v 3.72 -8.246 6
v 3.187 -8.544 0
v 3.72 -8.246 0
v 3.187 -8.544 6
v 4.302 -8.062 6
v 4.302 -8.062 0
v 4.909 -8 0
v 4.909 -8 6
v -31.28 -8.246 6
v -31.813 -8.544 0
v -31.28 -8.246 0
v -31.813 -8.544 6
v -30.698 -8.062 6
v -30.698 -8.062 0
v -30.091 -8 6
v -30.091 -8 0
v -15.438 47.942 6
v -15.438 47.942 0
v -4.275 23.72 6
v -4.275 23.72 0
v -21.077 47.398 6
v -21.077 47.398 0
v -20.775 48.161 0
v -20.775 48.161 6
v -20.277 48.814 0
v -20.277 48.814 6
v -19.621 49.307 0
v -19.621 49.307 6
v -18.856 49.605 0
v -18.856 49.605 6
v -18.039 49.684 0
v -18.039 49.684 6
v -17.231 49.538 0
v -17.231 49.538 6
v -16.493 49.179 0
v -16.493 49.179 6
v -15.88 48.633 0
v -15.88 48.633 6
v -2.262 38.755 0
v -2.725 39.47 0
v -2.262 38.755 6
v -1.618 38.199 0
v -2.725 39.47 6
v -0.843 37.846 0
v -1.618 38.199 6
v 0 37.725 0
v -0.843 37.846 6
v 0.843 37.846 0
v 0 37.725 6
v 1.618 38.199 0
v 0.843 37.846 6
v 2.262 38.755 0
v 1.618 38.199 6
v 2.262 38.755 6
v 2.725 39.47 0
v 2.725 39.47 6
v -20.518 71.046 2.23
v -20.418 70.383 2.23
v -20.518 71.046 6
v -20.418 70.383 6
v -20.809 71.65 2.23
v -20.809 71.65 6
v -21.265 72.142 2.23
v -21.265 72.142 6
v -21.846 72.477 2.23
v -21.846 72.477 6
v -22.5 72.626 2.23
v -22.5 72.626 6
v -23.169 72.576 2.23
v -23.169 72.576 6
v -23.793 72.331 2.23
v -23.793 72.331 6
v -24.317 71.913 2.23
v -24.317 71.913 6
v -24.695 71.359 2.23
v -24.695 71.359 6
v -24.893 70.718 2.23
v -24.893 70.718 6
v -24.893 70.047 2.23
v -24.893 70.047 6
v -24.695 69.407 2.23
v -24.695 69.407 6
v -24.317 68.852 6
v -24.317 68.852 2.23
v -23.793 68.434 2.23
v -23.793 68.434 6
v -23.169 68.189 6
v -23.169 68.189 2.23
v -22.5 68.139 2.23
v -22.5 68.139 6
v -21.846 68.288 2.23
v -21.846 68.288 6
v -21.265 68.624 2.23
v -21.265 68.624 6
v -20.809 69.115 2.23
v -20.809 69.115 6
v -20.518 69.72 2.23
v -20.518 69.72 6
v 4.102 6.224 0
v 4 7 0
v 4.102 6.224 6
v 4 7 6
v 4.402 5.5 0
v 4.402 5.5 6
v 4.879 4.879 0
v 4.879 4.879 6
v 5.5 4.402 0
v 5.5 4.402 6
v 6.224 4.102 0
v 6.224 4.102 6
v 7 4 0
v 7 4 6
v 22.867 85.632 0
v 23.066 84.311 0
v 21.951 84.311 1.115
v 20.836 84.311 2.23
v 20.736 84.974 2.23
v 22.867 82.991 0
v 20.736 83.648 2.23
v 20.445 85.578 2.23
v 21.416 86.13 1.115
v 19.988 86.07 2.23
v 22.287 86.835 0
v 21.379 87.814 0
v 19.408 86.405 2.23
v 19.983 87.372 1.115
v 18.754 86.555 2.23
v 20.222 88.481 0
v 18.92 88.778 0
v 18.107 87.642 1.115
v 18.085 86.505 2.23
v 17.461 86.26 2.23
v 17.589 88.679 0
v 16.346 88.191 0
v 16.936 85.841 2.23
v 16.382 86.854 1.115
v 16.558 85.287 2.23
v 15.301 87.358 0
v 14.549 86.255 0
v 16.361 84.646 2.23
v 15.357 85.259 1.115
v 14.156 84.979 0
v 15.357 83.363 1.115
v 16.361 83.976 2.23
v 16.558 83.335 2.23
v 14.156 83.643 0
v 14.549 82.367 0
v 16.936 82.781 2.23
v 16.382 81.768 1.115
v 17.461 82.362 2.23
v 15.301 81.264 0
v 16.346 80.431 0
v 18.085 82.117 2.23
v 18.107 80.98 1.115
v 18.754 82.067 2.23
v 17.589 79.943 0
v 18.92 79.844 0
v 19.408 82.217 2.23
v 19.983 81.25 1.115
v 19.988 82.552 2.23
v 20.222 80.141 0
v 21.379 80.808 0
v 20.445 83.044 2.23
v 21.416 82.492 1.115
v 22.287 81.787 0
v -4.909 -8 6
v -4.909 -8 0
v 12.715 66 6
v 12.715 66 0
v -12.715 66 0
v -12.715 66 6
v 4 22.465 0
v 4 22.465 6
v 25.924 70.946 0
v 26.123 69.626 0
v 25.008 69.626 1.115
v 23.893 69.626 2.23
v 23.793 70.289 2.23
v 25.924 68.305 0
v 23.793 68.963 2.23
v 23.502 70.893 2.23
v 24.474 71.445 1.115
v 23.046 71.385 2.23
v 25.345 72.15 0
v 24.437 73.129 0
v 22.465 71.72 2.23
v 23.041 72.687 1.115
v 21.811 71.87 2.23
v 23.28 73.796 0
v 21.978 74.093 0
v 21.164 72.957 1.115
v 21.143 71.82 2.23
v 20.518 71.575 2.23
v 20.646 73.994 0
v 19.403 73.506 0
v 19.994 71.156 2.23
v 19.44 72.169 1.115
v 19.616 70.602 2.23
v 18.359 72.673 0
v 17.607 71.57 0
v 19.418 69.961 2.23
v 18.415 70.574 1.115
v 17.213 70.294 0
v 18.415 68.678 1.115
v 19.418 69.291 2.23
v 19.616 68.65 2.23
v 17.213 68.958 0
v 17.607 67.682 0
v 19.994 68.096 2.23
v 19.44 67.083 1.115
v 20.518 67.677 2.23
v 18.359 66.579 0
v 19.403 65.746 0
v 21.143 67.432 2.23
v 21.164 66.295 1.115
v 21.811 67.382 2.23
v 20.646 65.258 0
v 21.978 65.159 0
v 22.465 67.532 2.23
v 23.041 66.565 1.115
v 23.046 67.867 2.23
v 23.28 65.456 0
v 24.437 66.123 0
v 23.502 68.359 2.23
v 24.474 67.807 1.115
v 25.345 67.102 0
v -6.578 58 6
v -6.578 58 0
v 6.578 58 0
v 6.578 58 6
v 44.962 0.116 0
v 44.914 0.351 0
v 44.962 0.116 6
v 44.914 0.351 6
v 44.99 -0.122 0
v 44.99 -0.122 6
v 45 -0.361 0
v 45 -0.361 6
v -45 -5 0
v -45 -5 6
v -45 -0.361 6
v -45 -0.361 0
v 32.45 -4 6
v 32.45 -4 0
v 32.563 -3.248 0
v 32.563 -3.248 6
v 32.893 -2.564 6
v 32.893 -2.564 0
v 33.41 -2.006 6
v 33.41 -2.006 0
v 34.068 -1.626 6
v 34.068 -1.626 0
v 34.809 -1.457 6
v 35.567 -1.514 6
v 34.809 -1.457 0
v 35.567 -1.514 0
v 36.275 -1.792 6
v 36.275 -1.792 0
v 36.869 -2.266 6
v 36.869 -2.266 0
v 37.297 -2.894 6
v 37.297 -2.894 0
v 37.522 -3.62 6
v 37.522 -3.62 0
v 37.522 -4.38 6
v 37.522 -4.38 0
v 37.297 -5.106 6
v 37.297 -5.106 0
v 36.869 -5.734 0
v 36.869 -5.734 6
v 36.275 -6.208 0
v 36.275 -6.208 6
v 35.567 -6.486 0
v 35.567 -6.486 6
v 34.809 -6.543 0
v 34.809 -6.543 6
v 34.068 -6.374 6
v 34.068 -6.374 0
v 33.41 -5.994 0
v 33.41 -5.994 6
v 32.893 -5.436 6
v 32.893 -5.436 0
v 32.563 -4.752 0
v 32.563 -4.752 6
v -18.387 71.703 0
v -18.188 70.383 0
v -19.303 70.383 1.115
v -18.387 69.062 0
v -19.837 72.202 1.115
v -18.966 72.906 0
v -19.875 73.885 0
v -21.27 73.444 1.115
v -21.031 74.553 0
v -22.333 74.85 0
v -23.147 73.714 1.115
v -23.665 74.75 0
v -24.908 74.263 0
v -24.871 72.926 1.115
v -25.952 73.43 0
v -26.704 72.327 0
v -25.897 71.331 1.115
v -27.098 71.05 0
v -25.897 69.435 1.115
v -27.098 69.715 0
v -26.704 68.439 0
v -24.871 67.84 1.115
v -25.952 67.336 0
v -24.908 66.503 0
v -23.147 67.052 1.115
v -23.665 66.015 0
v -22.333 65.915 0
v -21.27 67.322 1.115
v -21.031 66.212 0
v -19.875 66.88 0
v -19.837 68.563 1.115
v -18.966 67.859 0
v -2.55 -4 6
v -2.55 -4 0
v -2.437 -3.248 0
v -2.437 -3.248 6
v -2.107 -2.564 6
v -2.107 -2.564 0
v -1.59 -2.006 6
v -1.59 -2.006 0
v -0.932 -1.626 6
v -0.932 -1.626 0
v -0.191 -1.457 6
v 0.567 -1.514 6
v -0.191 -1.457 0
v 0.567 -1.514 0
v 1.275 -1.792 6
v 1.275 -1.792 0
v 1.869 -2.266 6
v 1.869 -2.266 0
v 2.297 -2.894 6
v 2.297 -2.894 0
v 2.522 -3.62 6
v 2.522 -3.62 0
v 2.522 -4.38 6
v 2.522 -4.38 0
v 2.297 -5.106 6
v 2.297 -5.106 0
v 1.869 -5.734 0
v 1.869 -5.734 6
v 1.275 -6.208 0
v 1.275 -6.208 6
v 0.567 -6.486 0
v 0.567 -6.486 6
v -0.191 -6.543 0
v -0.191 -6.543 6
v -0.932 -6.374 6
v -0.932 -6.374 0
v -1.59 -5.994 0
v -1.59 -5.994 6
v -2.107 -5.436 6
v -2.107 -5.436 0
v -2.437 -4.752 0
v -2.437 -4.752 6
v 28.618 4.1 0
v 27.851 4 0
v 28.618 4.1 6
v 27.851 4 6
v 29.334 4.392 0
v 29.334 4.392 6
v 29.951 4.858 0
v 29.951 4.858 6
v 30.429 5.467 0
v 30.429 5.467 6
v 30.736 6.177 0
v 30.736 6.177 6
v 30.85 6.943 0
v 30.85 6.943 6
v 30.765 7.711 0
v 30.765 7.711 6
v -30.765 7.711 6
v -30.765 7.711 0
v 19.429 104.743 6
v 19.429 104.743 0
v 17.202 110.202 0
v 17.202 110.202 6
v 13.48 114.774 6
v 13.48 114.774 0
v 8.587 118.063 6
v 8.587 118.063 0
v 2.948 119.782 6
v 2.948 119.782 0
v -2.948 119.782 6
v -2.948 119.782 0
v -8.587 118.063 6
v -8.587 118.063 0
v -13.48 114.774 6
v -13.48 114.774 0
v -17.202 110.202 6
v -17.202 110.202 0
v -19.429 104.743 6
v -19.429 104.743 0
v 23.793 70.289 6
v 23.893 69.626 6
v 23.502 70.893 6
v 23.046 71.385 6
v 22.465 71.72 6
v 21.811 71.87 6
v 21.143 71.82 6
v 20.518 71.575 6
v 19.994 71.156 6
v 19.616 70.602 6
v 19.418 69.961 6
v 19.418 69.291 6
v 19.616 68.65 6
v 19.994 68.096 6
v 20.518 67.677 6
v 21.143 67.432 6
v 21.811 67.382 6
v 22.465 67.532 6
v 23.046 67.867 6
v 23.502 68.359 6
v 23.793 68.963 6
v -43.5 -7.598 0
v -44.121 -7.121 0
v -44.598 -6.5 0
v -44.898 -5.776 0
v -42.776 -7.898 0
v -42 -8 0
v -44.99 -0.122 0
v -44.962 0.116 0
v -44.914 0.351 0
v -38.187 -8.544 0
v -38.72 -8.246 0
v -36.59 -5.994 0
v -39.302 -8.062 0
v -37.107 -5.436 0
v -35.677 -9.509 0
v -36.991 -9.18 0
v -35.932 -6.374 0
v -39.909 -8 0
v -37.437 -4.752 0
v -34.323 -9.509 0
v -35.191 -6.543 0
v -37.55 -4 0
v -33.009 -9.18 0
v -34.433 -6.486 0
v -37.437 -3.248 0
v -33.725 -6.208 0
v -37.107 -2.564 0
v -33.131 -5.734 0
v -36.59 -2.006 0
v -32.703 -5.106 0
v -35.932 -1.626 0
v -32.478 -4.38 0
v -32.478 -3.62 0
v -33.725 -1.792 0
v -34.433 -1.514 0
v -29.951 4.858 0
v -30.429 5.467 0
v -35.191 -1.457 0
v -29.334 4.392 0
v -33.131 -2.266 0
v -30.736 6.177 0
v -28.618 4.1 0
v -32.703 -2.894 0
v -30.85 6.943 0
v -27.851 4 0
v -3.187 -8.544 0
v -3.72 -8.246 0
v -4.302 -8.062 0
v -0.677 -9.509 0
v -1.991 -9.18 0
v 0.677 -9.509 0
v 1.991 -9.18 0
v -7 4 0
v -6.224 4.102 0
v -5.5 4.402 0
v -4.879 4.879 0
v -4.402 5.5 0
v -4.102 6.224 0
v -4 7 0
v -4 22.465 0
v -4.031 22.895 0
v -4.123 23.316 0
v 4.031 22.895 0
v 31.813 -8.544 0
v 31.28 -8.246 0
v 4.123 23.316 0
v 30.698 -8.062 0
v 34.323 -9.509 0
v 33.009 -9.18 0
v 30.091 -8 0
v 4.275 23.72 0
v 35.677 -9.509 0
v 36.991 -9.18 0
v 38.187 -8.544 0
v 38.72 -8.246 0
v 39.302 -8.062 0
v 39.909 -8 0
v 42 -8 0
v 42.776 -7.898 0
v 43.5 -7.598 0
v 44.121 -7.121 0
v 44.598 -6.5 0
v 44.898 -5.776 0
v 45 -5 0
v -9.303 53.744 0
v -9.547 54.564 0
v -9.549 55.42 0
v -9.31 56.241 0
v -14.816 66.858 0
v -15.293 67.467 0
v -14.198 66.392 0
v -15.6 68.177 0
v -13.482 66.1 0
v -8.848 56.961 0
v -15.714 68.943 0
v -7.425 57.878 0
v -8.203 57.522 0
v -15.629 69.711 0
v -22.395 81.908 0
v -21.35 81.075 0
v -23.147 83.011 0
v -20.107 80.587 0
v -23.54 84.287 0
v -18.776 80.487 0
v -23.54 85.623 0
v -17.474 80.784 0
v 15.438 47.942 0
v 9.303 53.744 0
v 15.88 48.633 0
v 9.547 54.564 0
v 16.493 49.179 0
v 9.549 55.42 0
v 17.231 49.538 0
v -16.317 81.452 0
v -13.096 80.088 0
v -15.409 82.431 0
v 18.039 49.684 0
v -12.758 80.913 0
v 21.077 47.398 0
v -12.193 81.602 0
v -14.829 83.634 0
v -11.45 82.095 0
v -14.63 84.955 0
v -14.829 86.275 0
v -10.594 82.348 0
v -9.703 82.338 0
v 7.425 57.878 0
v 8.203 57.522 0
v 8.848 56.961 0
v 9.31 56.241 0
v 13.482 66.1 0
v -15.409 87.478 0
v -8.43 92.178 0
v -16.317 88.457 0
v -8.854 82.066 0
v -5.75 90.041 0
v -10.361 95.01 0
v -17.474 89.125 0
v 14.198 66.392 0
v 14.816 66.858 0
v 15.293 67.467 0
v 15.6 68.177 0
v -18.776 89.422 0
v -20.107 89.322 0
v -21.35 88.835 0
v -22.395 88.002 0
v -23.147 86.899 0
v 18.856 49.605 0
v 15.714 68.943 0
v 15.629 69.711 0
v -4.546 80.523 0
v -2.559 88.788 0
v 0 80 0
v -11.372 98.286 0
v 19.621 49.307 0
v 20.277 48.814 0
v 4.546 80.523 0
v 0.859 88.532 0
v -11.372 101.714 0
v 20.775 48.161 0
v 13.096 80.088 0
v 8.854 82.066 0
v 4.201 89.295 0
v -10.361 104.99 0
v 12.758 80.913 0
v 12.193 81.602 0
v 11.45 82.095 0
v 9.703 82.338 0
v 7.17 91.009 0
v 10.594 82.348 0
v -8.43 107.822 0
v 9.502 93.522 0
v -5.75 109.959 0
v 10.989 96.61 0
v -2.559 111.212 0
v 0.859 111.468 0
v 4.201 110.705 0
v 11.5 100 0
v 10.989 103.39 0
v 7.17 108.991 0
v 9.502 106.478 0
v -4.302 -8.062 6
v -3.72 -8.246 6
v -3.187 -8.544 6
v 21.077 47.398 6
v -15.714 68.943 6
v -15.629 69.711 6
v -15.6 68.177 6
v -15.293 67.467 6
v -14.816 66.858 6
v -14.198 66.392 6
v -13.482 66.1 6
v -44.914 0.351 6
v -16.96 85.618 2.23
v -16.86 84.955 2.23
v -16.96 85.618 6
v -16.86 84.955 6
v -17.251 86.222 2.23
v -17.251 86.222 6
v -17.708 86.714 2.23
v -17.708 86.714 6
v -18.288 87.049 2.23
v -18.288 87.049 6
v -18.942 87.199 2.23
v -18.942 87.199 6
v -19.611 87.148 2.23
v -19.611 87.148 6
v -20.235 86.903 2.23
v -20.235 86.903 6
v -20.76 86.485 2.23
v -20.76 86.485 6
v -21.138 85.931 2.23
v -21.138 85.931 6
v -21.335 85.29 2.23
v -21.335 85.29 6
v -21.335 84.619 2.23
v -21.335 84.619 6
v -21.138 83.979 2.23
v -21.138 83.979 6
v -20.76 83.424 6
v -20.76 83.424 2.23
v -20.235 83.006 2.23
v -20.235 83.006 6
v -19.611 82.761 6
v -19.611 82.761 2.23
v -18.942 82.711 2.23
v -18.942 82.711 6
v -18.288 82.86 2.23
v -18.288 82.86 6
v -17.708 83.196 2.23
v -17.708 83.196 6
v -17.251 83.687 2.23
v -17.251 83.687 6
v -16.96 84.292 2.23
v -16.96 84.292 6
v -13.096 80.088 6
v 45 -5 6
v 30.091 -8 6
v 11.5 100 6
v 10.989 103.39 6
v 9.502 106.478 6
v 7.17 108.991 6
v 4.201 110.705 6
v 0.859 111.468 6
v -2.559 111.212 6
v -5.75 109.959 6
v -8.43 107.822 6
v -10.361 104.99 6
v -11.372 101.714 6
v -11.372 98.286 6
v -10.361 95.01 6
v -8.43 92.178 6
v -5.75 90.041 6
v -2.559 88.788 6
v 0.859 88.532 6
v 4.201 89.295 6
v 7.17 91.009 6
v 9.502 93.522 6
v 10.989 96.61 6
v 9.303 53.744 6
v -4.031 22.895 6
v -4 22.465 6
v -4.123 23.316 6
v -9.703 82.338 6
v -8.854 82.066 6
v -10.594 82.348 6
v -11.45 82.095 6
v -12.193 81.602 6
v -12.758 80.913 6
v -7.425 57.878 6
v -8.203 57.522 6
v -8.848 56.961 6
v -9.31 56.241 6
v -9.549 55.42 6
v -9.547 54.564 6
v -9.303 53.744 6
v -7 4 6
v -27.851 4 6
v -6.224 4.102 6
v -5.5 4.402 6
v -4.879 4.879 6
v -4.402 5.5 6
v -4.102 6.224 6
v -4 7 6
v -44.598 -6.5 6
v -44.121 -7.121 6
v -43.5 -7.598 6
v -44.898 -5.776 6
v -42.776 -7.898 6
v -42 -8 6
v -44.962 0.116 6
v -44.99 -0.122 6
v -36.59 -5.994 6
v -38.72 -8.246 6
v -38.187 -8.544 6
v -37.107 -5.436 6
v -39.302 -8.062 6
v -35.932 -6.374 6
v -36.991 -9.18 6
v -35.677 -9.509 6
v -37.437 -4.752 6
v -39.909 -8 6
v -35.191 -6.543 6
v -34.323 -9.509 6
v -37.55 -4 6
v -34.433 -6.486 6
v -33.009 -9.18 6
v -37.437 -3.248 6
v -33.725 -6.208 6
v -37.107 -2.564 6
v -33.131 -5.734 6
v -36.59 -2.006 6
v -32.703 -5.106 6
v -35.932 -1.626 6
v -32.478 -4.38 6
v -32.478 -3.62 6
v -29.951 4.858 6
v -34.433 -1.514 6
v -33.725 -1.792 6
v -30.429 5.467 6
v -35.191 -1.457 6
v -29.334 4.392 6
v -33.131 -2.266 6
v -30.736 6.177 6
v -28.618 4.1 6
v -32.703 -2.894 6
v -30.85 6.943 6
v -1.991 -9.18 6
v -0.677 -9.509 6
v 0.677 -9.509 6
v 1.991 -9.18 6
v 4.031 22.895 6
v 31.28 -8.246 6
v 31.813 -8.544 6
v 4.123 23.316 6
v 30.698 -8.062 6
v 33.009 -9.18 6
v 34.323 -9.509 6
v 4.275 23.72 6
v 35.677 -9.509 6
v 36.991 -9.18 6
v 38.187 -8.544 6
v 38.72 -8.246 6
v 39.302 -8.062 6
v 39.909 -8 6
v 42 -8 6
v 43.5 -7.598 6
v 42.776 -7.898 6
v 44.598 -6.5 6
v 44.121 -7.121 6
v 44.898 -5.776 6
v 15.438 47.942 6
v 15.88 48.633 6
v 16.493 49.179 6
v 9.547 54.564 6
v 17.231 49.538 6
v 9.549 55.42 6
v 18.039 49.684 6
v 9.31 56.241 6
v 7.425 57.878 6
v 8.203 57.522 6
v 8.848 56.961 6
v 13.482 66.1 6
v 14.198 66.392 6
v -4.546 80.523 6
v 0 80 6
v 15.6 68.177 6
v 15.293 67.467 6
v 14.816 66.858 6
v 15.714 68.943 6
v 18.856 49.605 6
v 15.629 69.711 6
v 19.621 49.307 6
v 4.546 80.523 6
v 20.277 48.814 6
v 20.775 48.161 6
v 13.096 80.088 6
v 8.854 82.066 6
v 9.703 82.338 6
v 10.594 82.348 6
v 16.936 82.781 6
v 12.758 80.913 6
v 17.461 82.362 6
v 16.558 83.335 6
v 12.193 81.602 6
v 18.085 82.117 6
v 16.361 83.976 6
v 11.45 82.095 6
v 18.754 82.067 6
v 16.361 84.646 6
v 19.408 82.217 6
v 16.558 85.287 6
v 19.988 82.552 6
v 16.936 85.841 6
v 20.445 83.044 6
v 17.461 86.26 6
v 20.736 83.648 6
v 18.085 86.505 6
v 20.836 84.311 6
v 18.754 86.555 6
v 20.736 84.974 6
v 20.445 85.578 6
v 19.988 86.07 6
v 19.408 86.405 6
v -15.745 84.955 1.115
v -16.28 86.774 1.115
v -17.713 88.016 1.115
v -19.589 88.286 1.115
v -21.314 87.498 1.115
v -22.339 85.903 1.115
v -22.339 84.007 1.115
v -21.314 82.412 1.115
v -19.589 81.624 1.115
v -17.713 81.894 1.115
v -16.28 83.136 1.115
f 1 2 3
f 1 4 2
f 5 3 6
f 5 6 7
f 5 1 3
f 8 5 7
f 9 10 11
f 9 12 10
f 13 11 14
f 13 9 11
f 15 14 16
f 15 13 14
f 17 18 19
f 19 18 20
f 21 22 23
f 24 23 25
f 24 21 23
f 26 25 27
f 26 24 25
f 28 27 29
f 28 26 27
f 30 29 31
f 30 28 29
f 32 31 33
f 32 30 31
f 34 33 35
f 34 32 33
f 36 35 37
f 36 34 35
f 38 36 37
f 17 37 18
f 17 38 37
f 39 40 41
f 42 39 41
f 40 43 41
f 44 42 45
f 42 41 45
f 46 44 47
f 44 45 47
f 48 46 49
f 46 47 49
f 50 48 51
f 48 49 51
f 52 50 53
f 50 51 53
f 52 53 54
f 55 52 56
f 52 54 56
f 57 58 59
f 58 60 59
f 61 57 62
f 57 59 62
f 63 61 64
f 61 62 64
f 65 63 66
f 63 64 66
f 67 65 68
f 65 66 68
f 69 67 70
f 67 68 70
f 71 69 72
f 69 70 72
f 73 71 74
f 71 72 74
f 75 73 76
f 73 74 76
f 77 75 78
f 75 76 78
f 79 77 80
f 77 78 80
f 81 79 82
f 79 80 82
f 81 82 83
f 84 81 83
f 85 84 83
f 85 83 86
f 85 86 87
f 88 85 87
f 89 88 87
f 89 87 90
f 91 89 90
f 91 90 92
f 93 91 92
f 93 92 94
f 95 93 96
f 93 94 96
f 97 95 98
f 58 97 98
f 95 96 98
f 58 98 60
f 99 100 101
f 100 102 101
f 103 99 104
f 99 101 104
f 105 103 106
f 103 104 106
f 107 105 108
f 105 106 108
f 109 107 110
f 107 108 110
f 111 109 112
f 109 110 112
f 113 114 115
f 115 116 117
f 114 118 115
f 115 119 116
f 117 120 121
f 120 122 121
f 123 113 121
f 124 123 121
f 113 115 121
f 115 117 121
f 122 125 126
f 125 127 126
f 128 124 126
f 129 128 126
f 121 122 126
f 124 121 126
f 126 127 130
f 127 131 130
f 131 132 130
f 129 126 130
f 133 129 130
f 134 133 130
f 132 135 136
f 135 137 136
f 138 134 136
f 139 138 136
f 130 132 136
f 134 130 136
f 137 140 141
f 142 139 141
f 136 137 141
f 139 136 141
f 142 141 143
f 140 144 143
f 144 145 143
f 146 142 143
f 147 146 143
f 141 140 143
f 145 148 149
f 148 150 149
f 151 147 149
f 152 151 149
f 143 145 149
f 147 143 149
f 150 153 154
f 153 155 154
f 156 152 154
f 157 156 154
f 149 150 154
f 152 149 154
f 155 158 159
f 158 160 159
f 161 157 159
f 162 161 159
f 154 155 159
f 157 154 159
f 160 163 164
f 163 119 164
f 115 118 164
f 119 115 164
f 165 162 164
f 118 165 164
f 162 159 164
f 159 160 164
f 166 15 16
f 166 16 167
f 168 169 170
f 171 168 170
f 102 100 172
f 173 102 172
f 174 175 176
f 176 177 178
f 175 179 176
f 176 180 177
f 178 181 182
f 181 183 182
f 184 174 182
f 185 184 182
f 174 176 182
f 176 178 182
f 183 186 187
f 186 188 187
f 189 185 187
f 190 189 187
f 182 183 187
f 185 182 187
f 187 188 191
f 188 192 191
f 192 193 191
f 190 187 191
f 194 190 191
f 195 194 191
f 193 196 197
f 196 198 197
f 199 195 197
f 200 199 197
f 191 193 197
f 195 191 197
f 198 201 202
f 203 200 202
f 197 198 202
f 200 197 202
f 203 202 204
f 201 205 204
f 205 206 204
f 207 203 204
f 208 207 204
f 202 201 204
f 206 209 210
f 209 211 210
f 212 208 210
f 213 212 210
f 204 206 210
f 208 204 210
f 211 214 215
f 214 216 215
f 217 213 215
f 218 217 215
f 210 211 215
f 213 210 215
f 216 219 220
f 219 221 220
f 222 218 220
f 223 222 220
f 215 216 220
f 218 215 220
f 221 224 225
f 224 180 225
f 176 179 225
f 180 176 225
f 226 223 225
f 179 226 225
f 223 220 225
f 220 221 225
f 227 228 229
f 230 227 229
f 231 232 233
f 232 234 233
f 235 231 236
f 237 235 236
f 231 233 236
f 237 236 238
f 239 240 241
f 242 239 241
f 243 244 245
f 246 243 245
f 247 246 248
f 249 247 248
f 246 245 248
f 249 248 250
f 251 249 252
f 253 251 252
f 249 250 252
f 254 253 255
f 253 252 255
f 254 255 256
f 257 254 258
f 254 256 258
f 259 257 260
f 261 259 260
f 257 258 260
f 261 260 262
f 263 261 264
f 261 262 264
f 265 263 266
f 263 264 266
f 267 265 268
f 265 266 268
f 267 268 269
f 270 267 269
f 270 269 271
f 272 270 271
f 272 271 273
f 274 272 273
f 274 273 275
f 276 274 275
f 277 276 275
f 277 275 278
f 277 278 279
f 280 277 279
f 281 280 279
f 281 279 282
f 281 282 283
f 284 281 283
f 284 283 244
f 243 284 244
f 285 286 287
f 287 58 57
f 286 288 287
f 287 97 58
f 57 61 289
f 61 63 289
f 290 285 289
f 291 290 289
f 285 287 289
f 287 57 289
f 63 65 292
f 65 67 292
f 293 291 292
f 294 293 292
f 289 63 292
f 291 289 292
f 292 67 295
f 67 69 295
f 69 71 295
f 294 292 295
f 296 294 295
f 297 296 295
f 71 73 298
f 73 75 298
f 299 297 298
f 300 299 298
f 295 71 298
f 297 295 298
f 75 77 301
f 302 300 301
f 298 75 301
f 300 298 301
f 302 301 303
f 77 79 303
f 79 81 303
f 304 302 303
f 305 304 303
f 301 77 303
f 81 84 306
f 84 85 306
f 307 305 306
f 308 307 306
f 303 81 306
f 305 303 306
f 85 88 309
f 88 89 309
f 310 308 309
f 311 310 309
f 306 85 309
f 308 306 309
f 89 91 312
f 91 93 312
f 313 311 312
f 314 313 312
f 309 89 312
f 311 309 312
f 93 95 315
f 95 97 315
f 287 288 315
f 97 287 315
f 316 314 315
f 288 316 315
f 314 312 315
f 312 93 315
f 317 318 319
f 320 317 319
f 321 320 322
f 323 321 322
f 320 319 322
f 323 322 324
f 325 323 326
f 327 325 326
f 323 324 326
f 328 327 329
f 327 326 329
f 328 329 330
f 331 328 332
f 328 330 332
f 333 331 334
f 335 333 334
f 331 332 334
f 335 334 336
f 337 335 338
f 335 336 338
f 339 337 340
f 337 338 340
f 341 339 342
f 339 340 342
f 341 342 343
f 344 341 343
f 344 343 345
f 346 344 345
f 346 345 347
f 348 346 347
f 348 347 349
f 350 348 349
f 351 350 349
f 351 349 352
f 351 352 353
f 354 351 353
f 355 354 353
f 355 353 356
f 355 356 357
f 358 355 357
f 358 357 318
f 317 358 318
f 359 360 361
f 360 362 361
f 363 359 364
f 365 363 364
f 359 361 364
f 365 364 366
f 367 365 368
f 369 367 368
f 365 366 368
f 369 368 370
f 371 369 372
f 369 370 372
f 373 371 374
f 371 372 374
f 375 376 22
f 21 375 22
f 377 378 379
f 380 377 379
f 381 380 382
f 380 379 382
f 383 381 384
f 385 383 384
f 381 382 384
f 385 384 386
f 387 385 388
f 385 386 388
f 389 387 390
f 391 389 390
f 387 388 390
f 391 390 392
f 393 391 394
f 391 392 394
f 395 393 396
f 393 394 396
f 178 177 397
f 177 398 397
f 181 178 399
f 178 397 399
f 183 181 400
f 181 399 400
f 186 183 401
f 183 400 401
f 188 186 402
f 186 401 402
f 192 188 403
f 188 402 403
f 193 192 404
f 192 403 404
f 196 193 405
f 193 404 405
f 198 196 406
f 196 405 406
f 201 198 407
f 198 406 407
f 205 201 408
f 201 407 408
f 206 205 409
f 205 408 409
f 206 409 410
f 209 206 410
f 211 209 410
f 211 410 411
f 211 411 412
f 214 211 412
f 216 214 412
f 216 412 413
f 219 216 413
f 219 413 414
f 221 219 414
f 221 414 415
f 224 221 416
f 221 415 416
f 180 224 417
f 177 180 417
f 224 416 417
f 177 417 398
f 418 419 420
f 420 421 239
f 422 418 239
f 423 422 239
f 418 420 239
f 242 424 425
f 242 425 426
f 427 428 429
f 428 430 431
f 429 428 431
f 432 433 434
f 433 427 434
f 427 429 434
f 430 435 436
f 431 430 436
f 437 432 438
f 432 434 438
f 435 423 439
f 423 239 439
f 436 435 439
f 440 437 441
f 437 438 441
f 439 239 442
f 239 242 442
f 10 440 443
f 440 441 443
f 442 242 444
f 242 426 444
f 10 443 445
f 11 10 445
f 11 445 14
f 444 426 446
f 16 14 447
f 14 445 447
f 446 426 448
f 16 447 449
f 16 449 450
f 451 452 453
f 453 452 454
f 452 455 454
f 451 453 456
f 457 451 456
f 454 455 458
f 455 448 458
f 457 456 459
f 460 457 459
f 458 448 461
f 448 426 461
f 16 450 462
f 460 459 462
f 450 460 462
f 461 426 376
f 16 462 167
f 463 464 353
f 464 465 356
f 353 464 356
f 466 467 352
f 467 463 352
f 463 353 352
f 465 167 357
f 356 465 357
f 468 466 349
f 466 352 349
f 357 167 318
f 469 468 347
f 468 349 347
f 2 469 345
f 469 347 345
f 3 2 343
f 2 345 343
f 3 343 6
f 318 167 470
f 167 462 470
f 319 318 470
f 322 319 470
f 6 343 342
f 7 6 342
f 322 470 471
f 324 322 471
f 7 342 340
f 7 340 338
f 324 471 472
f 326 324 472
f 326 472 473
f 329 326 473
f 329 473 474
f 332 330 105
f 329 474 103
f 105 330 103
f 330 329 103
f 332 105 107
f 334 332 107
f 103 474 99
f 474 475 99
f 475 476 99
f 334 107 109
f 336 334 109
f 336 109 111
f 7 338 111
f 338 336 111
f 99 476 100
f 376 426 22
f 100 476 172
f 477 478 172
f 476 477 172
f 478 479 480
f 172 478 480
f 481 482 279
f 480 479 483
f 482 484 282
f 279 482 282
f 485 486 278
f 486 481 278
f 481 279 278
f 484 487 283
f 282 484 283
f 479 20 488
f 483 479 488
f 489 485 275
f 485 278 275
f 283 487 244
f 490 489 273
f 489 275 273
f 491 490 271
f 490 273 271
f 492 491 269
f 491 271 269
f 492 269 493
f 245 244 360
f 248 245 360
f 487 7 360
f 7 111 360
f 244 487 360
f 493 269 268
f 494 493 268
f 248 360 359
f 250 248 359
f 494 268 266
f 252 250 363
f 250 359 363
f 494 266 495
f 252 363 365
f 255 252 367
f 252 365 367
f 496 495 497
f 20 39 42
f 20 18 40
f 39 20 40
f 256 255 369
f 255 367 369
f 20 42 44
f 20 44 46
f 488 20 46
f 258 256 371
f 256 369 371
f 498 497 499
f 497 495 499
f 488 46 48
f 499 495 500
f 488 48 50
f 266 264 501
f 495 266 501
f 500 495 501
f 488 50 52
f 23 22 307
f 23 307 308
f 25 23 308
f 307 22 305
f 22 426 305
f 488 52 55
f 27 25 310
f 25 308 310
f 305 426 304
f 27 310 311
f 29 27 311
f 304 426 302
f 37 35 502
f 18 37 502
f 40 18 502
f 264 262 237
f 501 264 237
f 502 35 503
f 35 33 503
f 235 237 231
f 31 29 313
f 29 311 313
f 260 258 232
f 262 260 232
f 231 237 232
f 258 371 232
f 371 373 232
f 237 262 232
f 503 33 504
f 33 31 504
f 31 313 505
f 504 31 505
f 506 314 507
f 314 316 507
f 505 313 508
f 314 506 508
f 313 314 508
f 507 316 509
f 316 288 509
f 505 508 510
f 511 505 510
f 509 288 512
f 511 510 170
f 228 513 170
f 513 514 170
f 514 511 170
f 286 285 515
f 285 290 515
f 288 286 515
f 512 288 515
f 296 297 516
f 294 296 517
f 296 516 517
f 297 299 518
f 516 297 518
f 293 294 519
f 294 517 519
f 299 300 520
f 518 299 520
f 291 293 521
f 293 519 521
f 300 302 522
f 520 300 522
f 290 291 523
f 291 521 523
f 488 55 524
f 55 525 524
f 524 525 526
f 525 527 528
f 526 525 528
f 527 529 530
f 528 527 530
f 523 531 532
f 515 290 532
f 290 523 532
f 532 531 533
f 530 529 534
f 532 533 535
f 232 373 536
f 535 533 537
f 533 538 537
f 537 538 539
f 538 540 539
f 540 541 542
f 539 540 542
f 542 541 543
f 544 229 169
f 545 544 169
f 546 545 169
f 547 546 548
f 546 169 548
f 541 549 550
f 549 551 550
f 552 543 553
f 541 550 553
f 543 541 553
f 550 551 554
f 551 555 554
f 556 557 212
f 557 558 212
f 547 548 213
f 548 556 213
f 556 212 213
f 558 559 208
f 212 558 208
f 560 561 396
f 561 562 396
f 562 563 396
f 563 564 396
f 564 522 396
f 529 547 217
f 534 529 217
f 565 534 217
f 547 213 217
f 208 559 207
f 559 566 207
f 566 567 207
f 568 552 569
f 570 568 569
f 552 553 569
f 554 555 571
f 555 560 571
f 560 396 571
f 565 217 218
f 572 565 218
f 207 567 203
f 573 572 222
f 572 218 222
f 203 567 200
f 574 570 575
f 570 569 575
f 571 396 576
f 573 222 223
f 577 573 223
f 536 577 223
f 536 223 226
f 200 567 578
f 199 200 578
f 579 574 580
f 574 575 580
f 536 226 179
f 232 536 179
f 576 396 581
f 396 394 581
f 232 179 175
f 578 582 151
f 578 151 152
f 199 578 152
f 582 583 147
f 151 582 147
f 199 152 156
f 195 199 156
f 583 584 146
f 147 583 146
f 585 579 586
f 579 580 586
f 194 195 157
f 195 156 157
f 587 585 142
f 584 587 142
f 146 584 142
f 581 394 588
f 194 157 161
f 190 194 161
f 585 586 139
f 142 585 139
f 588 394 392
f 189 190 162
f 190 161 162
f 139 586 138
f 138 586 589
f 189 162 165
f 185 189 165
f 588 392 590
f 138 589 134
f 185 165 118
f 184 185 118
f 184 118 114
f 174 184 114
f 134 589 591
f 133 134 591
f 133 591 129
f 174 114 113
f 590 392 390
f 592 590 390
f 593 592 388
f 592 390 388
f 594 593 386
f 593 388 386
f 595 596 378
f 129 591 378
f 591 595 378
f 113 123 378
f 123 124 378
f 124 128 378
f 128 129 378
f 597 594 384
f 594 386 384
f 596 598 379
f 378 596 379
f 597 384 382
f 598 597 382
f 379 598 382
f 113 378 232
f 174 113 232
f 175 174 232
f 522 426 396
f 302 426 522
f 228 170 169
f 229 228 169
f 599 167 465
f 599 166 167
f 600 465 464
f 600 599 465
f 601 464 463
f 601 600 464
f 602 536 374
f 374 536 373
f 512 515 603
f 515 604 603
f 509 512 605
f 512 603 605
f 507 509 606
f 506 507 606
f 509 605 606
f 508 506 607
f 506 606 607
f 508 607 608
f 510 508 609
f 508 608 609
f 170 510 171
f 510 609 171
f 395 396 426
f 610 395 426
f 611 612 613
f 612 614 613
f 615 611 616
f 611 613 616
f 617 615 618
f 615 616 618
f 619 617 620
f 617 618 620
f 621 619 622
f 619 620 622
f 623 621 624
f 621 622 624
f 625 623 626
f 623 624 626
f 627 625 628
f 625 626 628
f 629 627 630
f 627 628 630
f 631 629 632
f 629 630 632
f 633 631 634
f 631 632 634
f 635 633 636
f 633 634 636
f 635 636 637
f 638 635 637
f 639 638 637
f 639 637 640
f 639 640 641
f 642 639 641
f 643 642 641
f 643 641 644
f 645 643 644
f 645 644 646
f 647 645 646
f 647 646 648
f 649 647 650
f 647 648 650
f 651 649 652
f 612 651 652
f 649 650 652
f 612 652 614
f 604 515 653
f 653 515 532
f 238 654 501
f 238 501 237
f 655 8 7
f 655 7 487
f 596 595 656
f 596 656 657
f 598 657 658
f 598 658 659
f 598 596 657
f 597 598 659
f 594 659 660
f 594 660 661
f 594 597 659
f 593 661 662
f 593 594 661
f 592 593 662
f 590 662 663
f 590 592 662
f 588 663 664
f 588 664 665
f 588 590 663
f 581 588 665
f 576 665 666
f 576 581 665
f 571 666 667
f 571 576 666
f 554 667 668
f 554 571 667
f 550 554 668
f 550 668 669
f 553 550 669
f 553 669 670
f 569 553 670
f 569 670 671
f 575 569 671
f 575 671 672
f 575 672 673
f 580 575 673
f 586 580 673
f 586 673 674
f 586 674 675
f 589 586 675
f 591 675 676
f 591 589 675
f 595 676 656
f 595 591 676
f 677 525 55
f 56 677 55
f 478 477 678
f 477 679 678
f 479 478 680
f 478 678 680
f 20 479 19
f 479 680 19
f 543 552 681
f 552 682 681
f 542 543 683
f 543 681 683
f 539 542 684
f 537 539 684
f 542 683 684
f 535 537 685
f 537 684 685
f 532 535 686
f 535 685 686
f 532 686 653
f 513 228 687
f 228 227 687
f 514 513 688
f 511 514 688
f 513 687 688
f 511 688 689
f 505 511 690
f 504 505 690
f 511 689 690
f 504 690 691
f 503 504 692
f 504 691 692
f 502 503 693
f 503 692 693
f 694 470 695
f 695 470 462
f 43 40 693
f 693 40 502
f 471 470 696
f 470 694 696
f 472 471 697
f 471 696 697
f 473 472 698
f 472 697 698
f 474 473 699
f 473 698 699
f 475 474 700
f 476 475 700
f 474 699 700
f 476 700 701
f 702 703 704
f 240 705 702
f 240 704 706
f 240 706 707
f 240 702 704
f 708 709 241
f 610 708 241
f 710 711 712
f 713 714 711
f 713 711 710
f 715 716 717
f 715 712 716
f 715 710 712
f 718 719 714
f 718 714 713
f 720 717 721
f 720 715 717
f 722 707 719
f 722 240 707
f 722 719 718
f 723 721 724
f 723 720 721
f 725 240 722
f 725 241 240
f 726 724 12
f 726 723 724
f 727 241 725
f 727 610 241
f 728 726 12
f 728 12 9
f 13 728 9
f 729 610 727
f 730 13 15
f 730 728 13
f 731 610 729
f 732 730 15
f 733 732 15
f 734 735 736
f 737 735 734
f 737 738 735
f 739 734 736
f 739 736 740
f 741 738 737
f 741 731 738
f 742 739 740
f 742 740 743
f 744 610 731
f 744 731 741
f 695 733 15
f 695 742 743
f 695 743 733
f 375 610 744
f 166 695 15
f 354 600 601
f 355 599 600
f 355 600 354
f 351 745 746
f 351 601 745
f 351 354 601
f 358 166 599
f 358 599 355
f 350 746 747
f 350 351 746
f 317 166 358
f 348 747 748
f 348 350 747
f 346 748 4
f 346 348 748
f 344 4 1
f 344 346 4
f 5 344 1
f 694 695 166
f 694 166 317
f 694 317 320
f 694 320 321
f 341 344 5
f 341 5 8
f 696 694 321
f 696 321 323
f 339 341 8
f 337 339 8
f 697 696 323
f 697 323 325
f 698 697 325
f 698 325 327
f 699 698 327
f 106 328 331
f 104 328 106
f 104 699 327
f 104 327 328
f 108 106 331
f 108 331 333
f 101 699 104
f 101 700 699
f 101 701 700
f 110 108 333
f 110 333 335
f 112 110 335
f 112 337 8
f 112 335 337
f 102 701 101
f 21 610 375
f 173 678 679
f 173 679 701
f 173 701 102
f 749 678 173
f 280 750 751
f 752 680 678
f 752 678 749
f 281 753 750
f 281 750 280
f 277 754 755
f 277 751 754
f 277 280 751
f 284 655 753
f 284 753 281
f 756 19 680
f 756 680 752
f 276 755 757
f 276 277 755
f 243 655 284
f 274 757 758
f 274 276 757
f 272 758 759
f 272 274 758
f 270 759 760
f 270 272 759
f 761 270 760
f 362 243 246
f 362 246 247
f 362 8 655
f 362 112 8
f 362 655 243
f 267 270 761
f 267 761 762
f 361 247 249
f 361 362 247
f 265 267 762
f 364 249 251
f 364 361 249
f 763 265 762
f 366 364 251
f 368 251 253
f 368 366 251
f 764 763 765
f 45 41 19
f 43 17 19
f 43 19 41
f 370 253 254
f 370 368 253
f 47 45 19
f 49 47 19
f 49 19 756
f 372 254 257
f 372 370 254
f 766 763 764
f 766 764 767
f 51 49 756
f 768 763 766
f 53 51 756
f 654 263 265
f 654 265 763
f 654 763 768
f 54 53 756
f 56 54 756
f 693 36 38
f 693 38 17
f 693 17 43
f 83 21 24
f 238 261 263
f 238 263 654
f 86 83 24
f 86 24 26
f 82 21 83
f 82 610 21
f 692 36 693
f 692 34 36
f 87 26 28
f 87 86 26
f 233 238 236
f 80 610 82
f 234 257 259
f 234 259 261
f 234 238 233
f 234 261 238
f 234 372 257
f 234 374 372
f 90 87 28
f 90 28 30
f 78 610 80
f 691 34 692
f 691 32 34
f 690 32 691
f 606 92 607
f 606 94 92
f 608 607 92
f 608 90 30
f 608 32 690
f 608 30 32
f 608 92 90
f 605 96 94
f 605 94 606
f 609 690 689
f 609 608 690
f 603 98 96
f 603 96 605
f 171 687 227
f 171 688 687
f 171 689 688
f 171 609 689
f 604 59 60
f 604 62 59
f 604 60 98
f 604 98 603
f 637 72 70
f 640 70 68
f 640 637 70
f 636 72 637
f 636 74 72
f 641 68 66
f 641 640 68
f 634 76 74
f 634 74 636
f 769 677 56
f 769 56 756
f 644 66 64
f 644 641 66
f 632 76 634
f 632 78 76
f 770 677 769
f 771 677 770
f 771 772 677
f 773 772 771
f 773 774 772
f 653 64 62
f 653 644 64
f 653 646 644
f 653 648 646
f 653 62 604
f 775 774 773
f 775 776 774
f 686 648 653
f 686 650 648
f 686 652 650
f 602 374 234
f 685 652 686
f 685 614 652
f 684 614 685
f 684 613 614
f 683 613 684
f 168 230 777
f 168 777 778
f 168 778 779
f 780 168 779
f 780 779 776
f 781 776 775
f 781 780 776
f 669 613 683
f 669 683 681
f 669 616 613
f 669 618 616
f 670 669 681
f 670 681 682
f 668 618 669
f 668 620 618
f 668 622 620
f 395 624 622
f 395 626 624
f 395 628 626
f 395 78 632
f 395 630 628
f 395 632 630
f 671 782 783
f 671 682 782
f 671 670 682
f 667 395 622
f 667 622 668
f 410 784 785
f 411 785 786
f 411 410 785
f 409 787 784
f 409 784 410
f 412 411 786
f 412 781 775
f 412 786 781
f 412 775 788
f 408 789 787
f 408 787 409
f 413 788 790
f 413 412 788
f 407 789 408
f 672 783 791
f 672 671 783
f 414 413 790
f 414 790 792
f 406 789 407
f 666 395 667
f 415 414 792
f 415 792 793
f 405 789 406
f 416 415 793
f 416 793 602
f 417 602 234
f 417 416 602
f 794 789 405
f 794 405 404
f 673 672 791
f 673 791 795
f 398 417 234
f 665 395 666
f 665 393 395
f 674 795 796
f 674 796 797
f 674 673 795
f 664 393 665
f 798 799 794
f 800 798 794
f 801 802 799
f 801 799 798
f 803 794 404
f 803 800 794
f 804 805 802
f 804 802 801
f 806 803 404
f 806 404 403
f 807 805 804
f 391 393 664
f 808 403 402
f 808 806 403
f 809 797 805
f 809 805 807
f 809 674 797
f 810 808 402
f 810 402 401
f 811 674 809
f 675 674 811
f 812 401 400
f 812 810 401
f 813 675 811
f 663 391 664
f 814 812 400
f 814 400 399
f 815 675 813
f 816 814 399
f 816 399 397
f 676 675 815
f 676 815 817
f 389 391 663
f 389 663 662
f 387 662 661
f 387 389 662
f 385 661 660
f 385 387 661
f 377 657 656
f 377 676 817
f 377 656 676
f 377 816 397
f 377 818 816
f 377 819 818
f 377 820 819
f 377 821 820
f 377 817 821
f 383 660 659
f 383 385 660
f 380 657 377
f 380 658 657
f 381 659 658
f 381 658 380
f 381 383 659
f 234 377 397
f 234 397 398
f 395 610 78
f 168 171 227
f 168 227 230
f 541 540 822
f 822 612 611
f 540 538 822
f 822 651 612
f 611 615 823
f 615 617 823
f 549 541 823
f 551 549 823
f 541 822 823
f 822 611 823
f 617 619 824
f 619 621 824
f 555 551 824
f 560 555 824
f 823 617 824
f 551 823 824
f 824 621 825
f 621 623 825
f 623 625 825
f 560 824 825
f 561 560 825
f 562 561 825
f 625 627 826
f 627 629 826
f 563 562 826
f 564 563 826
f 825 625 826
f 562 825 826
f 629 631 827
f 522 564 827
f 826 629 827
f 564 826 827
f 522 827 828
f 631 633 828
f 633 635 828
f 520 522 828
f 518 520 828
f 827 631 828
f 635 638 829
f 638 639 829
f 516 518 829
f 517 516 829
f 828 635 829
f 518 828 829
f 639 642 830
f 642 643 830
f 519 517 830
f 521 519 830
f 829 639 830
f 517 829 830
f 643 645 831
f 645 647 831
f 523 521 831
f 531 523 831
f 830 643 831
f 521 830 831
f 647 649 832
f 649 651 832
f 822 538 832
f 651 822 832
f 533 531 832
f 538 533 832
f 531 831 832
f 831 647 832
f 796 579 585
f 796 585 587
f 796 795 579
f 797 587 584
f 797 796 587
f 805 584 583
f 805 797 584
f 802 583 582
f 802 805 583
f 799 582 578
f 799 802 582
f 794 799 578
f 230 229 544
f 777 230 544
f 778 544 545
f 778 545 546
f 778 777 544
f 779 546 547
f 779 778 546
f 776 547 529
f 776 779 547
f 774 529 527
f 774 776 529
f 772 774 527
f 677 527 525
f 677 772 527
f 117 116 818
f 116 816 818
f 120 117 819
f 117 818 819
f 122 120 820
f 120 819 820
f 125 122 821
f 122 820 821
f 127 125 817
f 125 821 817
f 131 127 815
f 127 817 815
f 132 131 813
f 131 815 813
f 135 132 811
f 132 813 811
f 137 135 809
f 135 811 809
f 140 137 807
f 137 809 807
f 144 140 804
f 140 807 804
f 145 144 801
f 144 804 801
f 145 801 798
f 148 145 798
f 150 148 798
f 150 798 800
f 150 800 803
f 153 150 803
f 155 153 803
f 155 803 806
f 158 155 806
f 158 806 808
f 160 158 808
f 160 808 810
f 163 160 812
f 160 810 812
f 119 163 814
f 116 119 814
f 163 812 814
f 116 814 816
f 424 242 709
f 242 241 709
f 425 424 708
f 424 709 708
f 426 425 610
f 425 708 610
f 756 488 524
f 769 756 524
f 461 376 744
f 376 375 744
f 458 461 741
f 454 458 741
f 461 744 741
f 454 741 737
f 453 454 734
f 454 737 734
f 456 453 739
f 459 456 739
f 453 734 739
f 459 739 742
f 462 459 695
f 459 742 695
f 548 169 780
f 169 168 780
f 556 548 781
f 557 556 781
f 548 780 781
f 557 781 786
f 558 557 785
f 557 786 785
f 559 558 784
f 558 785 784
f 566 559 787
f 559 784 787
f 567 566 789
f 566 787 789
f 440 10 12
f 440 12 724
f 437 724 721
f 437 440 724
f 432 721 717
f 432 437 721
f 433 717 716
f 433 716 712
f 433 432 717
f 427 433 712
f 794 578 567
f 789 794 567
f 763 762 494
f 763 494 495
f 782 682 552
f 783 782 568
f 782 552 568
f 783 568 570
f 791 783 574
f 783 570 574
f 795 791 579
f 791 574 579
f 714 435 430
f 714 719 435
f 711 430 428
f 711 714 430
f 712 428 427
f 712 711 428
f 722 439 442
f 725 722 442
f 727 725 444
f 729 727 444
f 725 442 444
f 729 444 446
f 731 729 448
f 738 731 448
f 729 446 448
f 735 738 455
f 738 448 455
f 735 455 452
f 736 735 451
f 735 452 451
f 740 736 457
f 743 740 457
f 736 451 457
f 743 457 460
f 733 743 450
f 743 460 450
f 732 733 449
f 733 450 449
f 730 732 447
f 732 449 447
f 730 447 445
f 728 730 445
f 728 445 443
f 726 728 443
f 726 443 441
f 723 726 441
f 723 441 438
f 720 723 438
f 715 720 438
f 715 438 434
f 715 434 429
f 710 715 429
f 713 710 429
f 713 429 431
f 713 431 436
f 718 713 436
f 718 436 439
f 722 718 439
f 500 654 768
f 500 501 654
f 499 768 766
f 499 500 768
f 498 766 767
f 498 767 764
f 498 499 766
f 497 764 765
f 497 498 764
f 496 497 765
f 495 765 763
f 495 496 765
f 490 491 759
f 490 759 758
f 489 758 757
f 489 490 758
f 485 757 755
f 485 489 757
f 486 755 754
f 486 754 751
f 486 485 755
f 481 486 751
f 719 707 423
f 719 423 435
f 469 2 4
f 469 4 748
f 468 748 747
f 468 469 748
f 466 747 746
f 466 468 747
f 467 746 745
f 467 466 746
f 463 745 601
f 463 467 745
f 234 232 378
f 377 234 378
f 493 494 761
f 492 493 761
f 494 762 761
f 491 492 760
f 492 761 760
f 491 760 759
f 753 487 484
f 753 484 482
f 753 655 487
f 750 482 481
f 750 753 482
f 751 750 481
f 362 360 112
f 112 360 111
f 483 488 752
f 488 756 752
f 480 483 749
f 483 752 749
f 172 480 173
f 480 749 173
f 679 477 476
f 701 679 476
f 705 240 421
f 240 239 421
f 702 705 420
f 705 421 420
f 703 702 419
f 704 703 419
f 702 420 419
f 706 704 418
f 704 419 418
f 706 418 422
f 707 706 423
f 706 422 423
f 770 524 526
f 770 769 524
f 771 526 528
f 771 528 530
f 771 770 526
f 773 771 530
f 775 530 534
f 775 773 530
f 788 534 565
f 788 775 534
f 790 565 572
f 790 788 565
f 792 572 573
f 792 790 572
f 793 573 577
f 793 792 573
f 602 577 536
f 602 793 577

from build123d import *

# Parameters (mm, degrees)
SKETCH_1_R                   = 20
SKETCH_1_R_2                 = 11.5
EXTRUDE_1_DEPTH              = 6
SKETCH_5_W                   = 90
SKETCH_5_H                   = 8
EXTRUDE_2_DEPTH              = 6
SKETCH_6_R                   = 2.1
CUT_EXTRUDE_1_DEPTH          = 129.300428682
HOLE_WIZARD_M4_1_D           = 4.5
HOLE_WIZARD_M4_1_DEPTH       = 11.4
HOLE_WIZARD_M4_1_CSINK_D     = 8.96
HOLE_WIZARD_M4_1_CSINK_ANGLE = 90
HOLE_WIZARD_M4_1_TIP         = 1.351936393
SKETCH_10_R                  = 2.55
CUT_EXTRUDE_2_DEPTH          = 129.300428682
EXTRUDE_4_DEPTH              = 6
CUT_EXTRUDE_3_DEPTH          = 129.300428682
FILLET_1_R                   = 3


with BuildPart() as part:
    # 草图1 → 凸台-拉伸1 (new body)
    # profile 1 of 3: a face of its own
    with BuildSketch(Plane.XY):
        with Locations((0, 100)):
            Circle(SKETCH_1_R)
        with Locations((0, 100)):
            Circle(SKETCH_1_R_2, mode=Mode.SUBTRACT)
    # profile 2 of 3: a face of its own
    with BuildSketch(Plane.XY):
        with BuildLine():
            Line((-19.429404285, 104.743231928), (-45, 0))
            Line((-45, 0), (45, 0))
            Line((45, 0), (19.429404285, 104.743231928))
            ThreePointArc((19.429404285, 104.743231928), (19.856838692, 102.388714539), (20, 100))
            ThreePointArc((20, 100), (-2.388714539, 80.143161308), (-19.429404285, 104.743231928))
        make_face()
    # profile 3 of 3: a face of its own
    with BuildSketch(Plane.XY):
        with BuildLine():
            Line((-19.429404285, 104.743231928), (-45, 0))
            Line((-45, 0), (45, 0))
            Line((45, 0), (19.429404285, 104.743231928))
            ThreePointArc((19.429404285, 104.743231928), (19.856838692, 102.388714539), (20, 100))
            ThreePointArc((20, 100), (-2.388714539, 80.143161308), (-19.429404285, 104.743231928))
        make_face()
    extrude(amount=EXTRUDE_1_DEPTH)

    # 草图5 → 凸台-拉伸2 (add)
    with BuildSketch(Plane.XY.offset(6)):
        with Locations((0, -4)):
            Rectangle(SKETCH_5_W, SKETCH_5_H)
    extrude(amount=-EXTRUDE_2_DEPTH)

    # 草图6 → 切除-拉伸1 (cut, through all)
    with BuildSketch(Plane.XY.offset(6)):
        with Locations((-22.667866245, 70.382755655)):
            Circle(SKETCH_6_R)
        with Locations((21.643312936, 69.625992562)):
            Circle(SKETCH_6_R)
        with Locations((18.58555253, 84.311022398)):
            Circle(SKETCH_6_R)
        with Locations((-19.110442299, 84.954808869)):
            Circle(SKETCH_6_R)
    extrude(amount=-CUT_EXTRUDE_1_DEPTH, mode=Mode.SUBTRACT)

    # M4 六角凹锥坑螺钉的锥形沉头孔1
    with Locations(Plane(origin=(0, 0, 0), x_dir=(-1, 0, 0), z_dir=(0, 0, -1))):
        with Locations((22.667866245, 70.382755655), (19.110442299, 84.954808869), (-18.58555253, 84.311022398), (-21.643312936, 69.625992562)):
            CounterSinkHole(HOLE_WIZARD_M4_1_D / 2, HOLE_WIZARD_M4_1_CSINK_D / 2, depth=HOLE_WIZARD_M4_1_DEPTH, counter_sink_angle=HOLE_WIZARD_M4_1_CSINK_ANGLE)
            with Locations((0, 0, -(HOLE_WIZARD_M4_1_DEPTH + HOLE_WIZARD_M4_1_TIP / 2))):  # 118° drill point
                Cone(0, HOLE_WIZARD_M4_1_D / 2, HOLE_WIZARD_M4_1_TIP, mode=Mode.SUBTRACT)

    # 草图10 → 切除-拉伸2 (cut, through all)
    with BuildSketch(Plane(origin=(0, 0, 0), x_dir=(-1, 0, 0), z_dir=(0, 0, -1))):
        with Locations((-35, -4)):
            Circle(SKETCH_10_R)
        with Locations((0, -4)):
            Circle(SKETCH_10_R)
        with Locations((35, -4)):
            Circle(SKETCH_10_R)
    extrude(amount=-CUT_EXTRUDE_2_DEPTH, mode=Mode.SUBTRACT)

    # 草图11 → 凸台-拉伸4 (add)
    with BuildSketch(Plane(origin=(0, 0, 0), x_dir=(-1, 0, 0), z_dir=(0, 0, -1))):
        with BuildLine():
            Line((-31.152598279, -8), (-38.847401721, -8))
            ThreePointArc((-38.847401721, -8), (-35, -9.55), (-31.152598279, -8))
        make_face()
        with BuildLine():
            Line((3.847401721, -8), (-3.847401721, -8))
            ThreePointArc((-3.847401721, -8), (0, -9.55), (3.847401721, -8))
        make_face()
        with BuildLine():
            ThreePointArc((31.152598279, -8), (35, -9.55), (38.847401721, -8))
            Line((38.847401721, -8), (31.152598279, -8))
        make_face()
    extrude(amount=-EXTRUDE_4_DEPTH)

    # 草图9 → 切除-拉伸3 (cut, through all)
    with BuildSketch(Plane(origin=(0, 0, 0), x_dir=(-1, 0, 0), z_dir=(0, 0, -1))):
        with BuildLine():
            ThreePointArc((12.119005584, 84.089949602), (0, 80), (-12.119005584, 84.089949602))
            Line((-12.119005584, 84.089949602), (-16.535241166, 66))
            Line((-16.535241166, 66), (16.535241166, 66))
            Line((16.535241166, 66), (12.119005584, 84.089949602))
        make_face()
        Polygon((11.264099529, 58), (-11.264099529, 58), (0, 33.55721992), align=None)
        Polygon((-4, 23.122667902), (-19.036946629, 55.752420381), (-31.671082453, 4), (-4, 4), align=None)
        Polygon((31.671082453, 4), (19.036946629, 55.752420381), (4, 23.122667902), (4, 4), align=None)
    extrude(amount=-CUT_EXTRUDE_3_DEPTH, mode=Mode.SUBTRACT)

    # 圆角1
    fillet_1_edges = [part.edges().sort_by_distance(p)[0] for p in [
        (45, 0, 3),
        (-45, 0, 3),
        (31.152598279, -8, 3),
        (38.847401721, -8, 3),
        (-3.847401721, -8, 3),
        (3.847401721, -8, 3),
        (-38.847401721, -8, 3),
        (-31.152598279, -8, 3),
        (12.119005584, 84.089949602, 3),
        (-12.119005584, 84.089949602, 3),
        (-16.535241166, 66, 3),
        (16.535241166, 66, 3),
        (-4, 23.122667902, 3),
        (-19.036946629, 55.752420381, 3),
        (-31.671082453, 4, 3),
        (-4, 4, 3),
        (11.264099529, 58, 3),
        (-11.264099529, 58, 3),
        (0, 33.55721992, 3),
        (4, 23.122667902, 3),
        (4, 4, 3),
        (31.671082453, 4, 3),
        (19.036946629, 55.752420381, 3),
        (-45, -8, 3),
        (45, -8, 3),
    ]]
    fillet(fillet_1_edges, radius=FILLET_1_R)


solid = part.part
